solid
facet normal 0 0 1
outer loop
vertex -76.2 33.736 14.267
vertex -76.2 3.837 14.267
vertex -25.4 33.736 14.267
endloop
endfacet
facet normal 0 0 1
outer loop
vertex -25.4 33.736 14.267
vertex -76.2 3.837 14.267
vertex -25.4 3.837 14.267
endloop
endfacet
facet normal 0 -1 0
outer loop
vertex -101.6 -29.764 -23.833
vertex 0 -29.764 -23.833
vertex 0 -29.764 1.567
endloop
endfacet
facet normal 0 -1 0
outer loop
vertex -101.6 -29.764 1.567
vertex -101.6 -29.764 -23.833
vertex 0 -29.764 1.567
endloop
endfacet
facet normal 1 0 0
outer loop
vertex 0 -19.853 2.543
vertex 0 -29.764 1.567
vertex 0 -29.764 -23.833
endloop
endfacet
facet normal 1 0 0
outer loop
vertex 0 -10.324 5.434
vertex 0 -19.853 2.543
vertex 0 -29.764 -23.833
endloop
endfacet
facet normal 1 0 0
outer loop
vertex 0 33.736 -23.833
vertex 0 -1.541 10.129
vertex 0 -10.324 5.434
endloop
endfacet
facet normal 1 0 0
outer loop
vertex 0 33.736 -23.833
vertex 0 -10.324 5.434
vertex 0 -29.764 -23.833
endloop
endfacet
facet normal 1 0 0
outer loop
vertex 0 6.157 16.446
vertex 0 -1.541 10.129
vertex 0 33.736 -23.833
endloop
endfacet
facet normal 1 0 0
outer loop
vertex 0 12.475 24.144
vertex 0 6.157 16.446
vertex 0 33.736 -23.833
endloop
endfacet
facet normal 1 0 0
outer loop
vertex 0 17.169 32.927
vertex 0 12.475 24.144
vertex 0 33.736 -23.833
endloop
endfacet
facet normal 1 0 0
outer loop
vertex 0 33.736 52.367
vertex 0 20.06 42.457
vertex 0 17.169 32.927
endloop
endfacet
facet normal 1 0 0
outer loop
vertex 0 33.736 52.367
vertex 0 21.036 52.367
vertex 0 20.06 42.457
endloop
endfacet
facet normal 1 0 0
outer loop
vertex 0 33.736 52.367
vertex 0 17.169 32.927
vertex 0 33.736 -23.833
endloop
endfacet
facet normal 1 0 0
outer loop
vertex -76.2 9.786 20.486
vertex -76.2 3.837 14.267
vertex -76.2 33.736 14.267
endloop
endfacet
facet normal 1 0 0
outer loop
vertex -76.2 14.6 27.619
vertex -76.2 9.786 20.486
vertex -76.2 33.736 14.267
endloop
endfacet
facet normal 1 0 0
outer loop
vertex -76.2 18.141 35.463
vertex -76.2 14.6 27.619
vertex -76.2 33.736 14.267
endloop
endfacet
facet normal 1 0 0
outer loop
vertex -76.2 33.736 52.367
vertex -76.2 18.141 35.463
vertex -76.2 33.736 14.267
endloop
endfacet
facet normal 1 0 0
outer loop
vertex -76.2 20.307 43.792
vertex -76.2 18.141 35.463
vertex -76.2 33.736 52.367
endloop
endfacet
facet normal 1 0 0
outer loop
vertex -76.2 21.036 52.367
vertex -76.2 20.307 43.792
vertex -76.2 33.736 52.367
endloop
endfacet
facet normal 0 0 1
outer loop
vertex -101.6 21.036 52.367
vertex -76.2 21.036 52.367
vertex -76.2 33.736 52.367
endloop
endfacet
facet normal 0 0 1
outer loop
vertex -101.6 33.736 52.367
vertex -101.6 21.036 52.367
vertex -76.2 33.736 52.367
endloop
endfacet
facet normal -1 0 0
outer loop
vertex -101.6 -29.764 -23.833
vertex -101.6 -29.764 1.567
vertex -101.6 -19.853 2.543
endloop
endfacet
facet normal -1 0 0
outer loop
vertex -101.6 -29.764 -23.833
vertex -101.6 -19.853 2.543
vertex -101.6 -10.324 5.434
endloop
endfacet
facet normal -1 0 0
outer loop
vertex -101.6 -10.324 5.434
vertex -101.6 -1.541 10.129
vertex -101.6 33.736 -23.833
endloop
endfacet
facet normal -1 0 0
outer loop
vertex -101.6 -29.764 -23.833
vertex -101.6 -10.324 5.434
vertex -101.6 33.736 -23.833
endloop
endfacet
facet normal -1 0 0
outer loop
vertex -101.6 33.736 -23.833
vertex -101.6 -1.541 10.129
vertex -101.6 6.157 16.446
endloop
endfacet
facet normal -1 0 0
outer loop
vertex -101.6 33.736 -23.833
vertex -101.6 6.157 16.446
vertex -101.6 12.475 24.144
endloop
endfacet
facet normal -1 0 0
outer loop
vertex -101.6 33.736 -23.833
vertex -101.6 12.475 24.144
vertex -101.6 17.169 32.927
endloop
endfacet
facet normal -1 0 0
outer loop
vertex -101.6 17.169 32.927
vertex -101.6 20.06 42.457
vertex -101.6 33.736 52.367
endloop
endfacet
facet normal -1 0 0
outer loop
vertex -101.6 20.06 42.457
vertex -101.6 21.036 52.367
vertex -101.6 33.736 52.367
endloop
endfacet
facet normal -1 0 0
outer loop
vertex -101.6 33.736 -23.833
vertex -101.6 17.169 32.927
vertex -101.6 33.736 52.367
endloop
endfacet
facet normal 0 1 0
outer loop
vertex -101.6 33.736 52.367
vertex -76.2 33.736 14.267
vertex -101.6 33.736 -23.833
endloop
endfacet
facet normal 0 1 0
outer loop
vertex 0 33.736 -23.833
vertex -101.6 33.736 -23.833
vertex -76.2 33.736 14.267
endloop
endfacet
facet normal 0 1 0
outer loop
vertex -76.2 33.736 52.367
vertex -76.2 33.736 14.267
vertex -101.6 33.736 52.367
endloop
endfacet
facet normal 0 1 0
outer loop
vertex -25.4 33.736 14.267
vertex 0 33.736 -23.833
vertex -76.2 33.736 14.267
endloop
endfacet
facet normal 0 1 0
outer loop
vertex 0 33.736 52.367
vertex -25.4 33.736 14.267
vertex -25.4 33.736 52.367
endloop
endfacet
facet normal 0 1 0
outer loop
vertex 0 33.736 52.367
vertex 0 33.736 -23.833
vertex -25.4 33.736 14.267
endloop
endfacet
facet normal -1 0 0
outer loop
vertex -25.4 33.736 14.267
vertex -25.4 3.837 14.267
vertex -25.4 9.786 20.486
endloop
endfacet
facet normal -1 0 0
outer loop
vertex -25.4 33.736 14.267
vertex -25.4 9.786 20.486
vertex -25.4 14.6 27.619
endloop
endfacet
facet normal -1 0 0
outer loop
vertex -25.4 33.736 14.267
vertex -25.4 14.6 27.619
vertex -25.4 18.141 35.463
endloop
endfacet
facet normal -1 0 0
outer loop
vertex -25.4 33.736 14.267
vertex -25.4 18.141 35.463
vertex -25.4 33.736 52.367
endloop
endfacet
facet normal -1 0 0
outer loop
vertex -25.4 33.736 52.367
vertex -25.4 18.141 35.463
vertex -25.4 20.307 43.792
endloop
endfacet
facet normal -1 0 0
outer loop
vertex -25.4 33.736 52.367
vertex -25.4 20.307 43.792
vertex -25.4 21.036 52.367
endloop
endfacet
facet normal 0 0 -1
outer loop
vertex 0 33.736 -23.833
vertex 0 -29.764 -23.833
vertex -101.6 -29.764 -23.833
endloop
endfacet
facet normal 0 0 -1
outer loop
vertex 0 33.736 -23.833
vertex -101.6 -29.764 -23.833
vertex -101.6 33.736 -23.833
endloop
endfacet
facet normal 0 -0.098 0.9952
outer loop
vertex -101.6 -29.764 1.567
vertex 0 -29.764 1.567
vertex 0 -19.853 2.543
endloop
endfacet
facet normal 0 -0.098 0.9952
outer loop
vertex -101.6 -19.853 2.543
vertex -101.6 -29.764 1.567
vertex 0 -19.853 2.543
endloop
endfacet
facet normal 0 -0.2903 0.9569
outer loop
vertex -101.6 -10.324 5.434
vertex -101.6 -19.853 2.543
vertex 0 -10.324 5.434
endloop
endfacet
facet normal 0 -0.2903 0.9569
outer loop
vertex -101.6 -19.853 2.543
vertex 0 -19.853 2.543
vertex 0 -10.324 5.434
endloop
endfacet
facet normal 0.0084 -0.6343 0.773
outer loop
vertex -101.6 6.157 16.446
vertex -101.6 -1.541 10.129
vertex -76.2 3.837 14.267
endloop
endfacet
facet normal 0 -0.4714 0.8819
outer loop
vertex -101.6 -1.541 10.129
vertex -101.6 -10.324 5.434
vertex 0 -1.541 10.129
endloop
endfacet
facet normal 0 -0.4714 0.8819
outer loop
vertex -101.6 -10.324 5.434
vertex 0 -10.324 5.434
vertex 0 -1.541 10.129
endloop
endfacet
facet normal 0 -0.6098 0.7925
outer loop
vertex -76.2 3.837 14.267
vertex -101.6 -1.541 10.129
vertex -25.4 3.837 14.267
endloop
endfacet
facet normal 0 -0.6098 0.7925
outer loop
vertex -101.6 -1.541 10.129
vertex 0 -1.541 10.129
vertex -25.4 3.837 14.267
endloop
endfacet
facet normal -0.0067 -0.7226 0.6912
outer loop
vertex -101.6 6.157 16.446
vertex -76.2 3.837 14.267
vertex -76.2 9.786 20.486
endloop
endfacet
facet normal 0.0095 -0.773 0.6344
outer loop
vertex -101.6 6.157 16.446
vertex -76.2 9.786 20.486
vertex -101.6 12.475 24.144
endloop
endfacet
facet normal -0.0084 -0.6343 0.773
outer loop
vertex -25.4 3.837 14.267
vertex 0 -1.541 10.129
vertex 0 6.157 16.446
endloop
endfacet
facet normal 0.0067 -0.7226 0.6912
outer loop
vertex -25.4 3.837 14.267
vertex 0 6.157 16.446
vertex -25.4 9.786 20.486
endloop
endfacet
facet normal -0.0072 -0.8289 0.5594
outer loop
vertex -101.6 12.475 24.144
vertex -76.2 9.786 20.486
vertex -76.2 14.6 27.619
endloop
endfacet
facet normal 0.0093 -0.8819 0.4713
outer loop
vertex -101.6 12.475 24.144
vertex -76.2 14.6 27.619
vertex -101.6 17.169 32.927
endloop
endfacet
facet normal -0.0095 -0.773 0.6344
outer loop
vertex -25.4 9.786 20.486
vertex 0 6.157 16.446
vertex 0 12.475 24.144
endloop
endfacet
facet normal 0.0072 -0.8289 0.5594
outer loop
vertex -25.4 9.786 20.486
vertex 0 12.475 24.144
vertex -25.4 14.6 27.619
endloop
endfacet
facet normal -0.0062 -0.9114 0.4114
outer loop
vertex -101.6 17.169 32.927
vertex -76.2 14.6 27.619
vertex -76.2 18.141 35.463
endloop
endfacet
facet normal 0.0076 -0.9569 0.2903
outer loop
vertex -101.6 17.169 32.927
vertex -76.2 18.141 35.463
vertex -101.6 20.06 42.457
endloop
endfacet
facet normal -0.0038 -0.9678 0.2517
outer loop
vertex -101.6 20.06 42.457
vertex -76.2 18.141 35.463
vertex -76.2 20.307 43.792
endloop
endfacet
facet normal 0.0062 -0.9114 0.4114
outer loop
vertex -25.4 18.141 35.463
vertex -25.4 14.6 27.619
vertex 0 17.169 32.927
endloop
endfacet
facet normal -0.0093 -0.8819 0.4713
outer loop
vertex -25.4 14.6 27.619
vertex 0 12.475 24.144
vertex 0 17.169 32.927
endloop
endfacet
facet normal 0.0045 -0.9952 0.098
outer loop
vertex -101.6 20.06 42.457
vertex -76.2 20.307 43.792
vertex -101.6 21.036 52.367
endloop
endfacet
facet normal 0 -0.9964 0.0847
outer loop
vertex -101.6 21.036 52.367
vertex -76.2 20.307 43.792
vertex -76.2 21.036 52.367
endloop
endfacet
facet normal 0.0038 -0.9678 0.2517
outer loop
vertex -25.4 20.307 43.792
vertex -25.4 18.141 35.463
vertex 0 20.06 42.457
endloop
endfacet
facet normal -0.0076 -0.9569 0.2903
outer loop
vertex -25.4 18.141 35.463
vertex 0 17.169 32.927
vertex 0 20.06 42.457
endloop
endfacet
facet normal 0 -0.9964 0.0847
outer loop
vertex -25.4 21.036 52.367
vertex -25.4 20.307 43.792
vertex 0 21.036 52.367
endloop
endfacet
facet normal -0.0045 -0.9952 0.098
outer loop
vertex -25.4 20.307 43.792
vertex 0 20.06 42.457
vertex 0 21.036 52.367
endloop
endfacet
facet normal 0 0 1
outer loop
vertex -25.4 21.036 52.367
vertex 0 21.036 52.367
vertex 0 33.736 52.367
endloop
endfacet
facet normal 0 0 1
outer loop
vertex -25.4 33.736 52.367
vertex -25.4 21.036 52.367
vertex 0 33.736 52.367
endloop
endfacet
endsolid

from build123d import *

# Parameters (mm, degrees)
F0_W     = 63.5
F0_H     = 76.2
F1_DEPTH = 101.6
F3_W     = 50.8
F3_H     = 38.1
F4_DEPTH = 63.501
F5_DEPTH = 101.601


with BuildPart() as f1:
    # F0 (on Right) → F1 (new body)
    with BuildSketch(Plane.YZ):
        with Locations((1.986064, 14.267234)):
            Rectangle(F0_W, F0_H)
    extrude(amount=-F1_DEPTH)

    # F3 (on face) → F4 (cut, through all)
    with BuildSketch(Plane.XZ.offset(29.763936)):
        with Locations((-50.8, 33.317234)):
            Rectangle(F3_W, F3_H)
    extrude(amount=-F4_DEPTH, mode=Mode.SUBTRACT)

    # F2 (on face) → F5 (cut, through all)
    with BuildSketch(Plane.YZ):
        with BuildLine():
            ThreePointArc((-29.763936, 1.567234), (6.157089, 16.446209), (21.036064, 52.367234))
            Line((21.036064, 52.367234), (-29.763936, 52.367234))
            Line((-29.763936, 52.367234), (-29.763936, 1.567234))
        make_face()
        with BuildLine():
            Line((-29.763936, 52.367234), (21.036064, 52.367234))
            ThreePointArc((21.036064, 52.367234), (-65.68496, 88.288258), (-29.763936, 1.567234))
            Line((-29.763936, 1.567234), (-29.763936, 52.367234))
        make_face()
    extrude(amount=-F5_DEPTH, mode=Mode.SUBTRACT)


solid = f1.part
